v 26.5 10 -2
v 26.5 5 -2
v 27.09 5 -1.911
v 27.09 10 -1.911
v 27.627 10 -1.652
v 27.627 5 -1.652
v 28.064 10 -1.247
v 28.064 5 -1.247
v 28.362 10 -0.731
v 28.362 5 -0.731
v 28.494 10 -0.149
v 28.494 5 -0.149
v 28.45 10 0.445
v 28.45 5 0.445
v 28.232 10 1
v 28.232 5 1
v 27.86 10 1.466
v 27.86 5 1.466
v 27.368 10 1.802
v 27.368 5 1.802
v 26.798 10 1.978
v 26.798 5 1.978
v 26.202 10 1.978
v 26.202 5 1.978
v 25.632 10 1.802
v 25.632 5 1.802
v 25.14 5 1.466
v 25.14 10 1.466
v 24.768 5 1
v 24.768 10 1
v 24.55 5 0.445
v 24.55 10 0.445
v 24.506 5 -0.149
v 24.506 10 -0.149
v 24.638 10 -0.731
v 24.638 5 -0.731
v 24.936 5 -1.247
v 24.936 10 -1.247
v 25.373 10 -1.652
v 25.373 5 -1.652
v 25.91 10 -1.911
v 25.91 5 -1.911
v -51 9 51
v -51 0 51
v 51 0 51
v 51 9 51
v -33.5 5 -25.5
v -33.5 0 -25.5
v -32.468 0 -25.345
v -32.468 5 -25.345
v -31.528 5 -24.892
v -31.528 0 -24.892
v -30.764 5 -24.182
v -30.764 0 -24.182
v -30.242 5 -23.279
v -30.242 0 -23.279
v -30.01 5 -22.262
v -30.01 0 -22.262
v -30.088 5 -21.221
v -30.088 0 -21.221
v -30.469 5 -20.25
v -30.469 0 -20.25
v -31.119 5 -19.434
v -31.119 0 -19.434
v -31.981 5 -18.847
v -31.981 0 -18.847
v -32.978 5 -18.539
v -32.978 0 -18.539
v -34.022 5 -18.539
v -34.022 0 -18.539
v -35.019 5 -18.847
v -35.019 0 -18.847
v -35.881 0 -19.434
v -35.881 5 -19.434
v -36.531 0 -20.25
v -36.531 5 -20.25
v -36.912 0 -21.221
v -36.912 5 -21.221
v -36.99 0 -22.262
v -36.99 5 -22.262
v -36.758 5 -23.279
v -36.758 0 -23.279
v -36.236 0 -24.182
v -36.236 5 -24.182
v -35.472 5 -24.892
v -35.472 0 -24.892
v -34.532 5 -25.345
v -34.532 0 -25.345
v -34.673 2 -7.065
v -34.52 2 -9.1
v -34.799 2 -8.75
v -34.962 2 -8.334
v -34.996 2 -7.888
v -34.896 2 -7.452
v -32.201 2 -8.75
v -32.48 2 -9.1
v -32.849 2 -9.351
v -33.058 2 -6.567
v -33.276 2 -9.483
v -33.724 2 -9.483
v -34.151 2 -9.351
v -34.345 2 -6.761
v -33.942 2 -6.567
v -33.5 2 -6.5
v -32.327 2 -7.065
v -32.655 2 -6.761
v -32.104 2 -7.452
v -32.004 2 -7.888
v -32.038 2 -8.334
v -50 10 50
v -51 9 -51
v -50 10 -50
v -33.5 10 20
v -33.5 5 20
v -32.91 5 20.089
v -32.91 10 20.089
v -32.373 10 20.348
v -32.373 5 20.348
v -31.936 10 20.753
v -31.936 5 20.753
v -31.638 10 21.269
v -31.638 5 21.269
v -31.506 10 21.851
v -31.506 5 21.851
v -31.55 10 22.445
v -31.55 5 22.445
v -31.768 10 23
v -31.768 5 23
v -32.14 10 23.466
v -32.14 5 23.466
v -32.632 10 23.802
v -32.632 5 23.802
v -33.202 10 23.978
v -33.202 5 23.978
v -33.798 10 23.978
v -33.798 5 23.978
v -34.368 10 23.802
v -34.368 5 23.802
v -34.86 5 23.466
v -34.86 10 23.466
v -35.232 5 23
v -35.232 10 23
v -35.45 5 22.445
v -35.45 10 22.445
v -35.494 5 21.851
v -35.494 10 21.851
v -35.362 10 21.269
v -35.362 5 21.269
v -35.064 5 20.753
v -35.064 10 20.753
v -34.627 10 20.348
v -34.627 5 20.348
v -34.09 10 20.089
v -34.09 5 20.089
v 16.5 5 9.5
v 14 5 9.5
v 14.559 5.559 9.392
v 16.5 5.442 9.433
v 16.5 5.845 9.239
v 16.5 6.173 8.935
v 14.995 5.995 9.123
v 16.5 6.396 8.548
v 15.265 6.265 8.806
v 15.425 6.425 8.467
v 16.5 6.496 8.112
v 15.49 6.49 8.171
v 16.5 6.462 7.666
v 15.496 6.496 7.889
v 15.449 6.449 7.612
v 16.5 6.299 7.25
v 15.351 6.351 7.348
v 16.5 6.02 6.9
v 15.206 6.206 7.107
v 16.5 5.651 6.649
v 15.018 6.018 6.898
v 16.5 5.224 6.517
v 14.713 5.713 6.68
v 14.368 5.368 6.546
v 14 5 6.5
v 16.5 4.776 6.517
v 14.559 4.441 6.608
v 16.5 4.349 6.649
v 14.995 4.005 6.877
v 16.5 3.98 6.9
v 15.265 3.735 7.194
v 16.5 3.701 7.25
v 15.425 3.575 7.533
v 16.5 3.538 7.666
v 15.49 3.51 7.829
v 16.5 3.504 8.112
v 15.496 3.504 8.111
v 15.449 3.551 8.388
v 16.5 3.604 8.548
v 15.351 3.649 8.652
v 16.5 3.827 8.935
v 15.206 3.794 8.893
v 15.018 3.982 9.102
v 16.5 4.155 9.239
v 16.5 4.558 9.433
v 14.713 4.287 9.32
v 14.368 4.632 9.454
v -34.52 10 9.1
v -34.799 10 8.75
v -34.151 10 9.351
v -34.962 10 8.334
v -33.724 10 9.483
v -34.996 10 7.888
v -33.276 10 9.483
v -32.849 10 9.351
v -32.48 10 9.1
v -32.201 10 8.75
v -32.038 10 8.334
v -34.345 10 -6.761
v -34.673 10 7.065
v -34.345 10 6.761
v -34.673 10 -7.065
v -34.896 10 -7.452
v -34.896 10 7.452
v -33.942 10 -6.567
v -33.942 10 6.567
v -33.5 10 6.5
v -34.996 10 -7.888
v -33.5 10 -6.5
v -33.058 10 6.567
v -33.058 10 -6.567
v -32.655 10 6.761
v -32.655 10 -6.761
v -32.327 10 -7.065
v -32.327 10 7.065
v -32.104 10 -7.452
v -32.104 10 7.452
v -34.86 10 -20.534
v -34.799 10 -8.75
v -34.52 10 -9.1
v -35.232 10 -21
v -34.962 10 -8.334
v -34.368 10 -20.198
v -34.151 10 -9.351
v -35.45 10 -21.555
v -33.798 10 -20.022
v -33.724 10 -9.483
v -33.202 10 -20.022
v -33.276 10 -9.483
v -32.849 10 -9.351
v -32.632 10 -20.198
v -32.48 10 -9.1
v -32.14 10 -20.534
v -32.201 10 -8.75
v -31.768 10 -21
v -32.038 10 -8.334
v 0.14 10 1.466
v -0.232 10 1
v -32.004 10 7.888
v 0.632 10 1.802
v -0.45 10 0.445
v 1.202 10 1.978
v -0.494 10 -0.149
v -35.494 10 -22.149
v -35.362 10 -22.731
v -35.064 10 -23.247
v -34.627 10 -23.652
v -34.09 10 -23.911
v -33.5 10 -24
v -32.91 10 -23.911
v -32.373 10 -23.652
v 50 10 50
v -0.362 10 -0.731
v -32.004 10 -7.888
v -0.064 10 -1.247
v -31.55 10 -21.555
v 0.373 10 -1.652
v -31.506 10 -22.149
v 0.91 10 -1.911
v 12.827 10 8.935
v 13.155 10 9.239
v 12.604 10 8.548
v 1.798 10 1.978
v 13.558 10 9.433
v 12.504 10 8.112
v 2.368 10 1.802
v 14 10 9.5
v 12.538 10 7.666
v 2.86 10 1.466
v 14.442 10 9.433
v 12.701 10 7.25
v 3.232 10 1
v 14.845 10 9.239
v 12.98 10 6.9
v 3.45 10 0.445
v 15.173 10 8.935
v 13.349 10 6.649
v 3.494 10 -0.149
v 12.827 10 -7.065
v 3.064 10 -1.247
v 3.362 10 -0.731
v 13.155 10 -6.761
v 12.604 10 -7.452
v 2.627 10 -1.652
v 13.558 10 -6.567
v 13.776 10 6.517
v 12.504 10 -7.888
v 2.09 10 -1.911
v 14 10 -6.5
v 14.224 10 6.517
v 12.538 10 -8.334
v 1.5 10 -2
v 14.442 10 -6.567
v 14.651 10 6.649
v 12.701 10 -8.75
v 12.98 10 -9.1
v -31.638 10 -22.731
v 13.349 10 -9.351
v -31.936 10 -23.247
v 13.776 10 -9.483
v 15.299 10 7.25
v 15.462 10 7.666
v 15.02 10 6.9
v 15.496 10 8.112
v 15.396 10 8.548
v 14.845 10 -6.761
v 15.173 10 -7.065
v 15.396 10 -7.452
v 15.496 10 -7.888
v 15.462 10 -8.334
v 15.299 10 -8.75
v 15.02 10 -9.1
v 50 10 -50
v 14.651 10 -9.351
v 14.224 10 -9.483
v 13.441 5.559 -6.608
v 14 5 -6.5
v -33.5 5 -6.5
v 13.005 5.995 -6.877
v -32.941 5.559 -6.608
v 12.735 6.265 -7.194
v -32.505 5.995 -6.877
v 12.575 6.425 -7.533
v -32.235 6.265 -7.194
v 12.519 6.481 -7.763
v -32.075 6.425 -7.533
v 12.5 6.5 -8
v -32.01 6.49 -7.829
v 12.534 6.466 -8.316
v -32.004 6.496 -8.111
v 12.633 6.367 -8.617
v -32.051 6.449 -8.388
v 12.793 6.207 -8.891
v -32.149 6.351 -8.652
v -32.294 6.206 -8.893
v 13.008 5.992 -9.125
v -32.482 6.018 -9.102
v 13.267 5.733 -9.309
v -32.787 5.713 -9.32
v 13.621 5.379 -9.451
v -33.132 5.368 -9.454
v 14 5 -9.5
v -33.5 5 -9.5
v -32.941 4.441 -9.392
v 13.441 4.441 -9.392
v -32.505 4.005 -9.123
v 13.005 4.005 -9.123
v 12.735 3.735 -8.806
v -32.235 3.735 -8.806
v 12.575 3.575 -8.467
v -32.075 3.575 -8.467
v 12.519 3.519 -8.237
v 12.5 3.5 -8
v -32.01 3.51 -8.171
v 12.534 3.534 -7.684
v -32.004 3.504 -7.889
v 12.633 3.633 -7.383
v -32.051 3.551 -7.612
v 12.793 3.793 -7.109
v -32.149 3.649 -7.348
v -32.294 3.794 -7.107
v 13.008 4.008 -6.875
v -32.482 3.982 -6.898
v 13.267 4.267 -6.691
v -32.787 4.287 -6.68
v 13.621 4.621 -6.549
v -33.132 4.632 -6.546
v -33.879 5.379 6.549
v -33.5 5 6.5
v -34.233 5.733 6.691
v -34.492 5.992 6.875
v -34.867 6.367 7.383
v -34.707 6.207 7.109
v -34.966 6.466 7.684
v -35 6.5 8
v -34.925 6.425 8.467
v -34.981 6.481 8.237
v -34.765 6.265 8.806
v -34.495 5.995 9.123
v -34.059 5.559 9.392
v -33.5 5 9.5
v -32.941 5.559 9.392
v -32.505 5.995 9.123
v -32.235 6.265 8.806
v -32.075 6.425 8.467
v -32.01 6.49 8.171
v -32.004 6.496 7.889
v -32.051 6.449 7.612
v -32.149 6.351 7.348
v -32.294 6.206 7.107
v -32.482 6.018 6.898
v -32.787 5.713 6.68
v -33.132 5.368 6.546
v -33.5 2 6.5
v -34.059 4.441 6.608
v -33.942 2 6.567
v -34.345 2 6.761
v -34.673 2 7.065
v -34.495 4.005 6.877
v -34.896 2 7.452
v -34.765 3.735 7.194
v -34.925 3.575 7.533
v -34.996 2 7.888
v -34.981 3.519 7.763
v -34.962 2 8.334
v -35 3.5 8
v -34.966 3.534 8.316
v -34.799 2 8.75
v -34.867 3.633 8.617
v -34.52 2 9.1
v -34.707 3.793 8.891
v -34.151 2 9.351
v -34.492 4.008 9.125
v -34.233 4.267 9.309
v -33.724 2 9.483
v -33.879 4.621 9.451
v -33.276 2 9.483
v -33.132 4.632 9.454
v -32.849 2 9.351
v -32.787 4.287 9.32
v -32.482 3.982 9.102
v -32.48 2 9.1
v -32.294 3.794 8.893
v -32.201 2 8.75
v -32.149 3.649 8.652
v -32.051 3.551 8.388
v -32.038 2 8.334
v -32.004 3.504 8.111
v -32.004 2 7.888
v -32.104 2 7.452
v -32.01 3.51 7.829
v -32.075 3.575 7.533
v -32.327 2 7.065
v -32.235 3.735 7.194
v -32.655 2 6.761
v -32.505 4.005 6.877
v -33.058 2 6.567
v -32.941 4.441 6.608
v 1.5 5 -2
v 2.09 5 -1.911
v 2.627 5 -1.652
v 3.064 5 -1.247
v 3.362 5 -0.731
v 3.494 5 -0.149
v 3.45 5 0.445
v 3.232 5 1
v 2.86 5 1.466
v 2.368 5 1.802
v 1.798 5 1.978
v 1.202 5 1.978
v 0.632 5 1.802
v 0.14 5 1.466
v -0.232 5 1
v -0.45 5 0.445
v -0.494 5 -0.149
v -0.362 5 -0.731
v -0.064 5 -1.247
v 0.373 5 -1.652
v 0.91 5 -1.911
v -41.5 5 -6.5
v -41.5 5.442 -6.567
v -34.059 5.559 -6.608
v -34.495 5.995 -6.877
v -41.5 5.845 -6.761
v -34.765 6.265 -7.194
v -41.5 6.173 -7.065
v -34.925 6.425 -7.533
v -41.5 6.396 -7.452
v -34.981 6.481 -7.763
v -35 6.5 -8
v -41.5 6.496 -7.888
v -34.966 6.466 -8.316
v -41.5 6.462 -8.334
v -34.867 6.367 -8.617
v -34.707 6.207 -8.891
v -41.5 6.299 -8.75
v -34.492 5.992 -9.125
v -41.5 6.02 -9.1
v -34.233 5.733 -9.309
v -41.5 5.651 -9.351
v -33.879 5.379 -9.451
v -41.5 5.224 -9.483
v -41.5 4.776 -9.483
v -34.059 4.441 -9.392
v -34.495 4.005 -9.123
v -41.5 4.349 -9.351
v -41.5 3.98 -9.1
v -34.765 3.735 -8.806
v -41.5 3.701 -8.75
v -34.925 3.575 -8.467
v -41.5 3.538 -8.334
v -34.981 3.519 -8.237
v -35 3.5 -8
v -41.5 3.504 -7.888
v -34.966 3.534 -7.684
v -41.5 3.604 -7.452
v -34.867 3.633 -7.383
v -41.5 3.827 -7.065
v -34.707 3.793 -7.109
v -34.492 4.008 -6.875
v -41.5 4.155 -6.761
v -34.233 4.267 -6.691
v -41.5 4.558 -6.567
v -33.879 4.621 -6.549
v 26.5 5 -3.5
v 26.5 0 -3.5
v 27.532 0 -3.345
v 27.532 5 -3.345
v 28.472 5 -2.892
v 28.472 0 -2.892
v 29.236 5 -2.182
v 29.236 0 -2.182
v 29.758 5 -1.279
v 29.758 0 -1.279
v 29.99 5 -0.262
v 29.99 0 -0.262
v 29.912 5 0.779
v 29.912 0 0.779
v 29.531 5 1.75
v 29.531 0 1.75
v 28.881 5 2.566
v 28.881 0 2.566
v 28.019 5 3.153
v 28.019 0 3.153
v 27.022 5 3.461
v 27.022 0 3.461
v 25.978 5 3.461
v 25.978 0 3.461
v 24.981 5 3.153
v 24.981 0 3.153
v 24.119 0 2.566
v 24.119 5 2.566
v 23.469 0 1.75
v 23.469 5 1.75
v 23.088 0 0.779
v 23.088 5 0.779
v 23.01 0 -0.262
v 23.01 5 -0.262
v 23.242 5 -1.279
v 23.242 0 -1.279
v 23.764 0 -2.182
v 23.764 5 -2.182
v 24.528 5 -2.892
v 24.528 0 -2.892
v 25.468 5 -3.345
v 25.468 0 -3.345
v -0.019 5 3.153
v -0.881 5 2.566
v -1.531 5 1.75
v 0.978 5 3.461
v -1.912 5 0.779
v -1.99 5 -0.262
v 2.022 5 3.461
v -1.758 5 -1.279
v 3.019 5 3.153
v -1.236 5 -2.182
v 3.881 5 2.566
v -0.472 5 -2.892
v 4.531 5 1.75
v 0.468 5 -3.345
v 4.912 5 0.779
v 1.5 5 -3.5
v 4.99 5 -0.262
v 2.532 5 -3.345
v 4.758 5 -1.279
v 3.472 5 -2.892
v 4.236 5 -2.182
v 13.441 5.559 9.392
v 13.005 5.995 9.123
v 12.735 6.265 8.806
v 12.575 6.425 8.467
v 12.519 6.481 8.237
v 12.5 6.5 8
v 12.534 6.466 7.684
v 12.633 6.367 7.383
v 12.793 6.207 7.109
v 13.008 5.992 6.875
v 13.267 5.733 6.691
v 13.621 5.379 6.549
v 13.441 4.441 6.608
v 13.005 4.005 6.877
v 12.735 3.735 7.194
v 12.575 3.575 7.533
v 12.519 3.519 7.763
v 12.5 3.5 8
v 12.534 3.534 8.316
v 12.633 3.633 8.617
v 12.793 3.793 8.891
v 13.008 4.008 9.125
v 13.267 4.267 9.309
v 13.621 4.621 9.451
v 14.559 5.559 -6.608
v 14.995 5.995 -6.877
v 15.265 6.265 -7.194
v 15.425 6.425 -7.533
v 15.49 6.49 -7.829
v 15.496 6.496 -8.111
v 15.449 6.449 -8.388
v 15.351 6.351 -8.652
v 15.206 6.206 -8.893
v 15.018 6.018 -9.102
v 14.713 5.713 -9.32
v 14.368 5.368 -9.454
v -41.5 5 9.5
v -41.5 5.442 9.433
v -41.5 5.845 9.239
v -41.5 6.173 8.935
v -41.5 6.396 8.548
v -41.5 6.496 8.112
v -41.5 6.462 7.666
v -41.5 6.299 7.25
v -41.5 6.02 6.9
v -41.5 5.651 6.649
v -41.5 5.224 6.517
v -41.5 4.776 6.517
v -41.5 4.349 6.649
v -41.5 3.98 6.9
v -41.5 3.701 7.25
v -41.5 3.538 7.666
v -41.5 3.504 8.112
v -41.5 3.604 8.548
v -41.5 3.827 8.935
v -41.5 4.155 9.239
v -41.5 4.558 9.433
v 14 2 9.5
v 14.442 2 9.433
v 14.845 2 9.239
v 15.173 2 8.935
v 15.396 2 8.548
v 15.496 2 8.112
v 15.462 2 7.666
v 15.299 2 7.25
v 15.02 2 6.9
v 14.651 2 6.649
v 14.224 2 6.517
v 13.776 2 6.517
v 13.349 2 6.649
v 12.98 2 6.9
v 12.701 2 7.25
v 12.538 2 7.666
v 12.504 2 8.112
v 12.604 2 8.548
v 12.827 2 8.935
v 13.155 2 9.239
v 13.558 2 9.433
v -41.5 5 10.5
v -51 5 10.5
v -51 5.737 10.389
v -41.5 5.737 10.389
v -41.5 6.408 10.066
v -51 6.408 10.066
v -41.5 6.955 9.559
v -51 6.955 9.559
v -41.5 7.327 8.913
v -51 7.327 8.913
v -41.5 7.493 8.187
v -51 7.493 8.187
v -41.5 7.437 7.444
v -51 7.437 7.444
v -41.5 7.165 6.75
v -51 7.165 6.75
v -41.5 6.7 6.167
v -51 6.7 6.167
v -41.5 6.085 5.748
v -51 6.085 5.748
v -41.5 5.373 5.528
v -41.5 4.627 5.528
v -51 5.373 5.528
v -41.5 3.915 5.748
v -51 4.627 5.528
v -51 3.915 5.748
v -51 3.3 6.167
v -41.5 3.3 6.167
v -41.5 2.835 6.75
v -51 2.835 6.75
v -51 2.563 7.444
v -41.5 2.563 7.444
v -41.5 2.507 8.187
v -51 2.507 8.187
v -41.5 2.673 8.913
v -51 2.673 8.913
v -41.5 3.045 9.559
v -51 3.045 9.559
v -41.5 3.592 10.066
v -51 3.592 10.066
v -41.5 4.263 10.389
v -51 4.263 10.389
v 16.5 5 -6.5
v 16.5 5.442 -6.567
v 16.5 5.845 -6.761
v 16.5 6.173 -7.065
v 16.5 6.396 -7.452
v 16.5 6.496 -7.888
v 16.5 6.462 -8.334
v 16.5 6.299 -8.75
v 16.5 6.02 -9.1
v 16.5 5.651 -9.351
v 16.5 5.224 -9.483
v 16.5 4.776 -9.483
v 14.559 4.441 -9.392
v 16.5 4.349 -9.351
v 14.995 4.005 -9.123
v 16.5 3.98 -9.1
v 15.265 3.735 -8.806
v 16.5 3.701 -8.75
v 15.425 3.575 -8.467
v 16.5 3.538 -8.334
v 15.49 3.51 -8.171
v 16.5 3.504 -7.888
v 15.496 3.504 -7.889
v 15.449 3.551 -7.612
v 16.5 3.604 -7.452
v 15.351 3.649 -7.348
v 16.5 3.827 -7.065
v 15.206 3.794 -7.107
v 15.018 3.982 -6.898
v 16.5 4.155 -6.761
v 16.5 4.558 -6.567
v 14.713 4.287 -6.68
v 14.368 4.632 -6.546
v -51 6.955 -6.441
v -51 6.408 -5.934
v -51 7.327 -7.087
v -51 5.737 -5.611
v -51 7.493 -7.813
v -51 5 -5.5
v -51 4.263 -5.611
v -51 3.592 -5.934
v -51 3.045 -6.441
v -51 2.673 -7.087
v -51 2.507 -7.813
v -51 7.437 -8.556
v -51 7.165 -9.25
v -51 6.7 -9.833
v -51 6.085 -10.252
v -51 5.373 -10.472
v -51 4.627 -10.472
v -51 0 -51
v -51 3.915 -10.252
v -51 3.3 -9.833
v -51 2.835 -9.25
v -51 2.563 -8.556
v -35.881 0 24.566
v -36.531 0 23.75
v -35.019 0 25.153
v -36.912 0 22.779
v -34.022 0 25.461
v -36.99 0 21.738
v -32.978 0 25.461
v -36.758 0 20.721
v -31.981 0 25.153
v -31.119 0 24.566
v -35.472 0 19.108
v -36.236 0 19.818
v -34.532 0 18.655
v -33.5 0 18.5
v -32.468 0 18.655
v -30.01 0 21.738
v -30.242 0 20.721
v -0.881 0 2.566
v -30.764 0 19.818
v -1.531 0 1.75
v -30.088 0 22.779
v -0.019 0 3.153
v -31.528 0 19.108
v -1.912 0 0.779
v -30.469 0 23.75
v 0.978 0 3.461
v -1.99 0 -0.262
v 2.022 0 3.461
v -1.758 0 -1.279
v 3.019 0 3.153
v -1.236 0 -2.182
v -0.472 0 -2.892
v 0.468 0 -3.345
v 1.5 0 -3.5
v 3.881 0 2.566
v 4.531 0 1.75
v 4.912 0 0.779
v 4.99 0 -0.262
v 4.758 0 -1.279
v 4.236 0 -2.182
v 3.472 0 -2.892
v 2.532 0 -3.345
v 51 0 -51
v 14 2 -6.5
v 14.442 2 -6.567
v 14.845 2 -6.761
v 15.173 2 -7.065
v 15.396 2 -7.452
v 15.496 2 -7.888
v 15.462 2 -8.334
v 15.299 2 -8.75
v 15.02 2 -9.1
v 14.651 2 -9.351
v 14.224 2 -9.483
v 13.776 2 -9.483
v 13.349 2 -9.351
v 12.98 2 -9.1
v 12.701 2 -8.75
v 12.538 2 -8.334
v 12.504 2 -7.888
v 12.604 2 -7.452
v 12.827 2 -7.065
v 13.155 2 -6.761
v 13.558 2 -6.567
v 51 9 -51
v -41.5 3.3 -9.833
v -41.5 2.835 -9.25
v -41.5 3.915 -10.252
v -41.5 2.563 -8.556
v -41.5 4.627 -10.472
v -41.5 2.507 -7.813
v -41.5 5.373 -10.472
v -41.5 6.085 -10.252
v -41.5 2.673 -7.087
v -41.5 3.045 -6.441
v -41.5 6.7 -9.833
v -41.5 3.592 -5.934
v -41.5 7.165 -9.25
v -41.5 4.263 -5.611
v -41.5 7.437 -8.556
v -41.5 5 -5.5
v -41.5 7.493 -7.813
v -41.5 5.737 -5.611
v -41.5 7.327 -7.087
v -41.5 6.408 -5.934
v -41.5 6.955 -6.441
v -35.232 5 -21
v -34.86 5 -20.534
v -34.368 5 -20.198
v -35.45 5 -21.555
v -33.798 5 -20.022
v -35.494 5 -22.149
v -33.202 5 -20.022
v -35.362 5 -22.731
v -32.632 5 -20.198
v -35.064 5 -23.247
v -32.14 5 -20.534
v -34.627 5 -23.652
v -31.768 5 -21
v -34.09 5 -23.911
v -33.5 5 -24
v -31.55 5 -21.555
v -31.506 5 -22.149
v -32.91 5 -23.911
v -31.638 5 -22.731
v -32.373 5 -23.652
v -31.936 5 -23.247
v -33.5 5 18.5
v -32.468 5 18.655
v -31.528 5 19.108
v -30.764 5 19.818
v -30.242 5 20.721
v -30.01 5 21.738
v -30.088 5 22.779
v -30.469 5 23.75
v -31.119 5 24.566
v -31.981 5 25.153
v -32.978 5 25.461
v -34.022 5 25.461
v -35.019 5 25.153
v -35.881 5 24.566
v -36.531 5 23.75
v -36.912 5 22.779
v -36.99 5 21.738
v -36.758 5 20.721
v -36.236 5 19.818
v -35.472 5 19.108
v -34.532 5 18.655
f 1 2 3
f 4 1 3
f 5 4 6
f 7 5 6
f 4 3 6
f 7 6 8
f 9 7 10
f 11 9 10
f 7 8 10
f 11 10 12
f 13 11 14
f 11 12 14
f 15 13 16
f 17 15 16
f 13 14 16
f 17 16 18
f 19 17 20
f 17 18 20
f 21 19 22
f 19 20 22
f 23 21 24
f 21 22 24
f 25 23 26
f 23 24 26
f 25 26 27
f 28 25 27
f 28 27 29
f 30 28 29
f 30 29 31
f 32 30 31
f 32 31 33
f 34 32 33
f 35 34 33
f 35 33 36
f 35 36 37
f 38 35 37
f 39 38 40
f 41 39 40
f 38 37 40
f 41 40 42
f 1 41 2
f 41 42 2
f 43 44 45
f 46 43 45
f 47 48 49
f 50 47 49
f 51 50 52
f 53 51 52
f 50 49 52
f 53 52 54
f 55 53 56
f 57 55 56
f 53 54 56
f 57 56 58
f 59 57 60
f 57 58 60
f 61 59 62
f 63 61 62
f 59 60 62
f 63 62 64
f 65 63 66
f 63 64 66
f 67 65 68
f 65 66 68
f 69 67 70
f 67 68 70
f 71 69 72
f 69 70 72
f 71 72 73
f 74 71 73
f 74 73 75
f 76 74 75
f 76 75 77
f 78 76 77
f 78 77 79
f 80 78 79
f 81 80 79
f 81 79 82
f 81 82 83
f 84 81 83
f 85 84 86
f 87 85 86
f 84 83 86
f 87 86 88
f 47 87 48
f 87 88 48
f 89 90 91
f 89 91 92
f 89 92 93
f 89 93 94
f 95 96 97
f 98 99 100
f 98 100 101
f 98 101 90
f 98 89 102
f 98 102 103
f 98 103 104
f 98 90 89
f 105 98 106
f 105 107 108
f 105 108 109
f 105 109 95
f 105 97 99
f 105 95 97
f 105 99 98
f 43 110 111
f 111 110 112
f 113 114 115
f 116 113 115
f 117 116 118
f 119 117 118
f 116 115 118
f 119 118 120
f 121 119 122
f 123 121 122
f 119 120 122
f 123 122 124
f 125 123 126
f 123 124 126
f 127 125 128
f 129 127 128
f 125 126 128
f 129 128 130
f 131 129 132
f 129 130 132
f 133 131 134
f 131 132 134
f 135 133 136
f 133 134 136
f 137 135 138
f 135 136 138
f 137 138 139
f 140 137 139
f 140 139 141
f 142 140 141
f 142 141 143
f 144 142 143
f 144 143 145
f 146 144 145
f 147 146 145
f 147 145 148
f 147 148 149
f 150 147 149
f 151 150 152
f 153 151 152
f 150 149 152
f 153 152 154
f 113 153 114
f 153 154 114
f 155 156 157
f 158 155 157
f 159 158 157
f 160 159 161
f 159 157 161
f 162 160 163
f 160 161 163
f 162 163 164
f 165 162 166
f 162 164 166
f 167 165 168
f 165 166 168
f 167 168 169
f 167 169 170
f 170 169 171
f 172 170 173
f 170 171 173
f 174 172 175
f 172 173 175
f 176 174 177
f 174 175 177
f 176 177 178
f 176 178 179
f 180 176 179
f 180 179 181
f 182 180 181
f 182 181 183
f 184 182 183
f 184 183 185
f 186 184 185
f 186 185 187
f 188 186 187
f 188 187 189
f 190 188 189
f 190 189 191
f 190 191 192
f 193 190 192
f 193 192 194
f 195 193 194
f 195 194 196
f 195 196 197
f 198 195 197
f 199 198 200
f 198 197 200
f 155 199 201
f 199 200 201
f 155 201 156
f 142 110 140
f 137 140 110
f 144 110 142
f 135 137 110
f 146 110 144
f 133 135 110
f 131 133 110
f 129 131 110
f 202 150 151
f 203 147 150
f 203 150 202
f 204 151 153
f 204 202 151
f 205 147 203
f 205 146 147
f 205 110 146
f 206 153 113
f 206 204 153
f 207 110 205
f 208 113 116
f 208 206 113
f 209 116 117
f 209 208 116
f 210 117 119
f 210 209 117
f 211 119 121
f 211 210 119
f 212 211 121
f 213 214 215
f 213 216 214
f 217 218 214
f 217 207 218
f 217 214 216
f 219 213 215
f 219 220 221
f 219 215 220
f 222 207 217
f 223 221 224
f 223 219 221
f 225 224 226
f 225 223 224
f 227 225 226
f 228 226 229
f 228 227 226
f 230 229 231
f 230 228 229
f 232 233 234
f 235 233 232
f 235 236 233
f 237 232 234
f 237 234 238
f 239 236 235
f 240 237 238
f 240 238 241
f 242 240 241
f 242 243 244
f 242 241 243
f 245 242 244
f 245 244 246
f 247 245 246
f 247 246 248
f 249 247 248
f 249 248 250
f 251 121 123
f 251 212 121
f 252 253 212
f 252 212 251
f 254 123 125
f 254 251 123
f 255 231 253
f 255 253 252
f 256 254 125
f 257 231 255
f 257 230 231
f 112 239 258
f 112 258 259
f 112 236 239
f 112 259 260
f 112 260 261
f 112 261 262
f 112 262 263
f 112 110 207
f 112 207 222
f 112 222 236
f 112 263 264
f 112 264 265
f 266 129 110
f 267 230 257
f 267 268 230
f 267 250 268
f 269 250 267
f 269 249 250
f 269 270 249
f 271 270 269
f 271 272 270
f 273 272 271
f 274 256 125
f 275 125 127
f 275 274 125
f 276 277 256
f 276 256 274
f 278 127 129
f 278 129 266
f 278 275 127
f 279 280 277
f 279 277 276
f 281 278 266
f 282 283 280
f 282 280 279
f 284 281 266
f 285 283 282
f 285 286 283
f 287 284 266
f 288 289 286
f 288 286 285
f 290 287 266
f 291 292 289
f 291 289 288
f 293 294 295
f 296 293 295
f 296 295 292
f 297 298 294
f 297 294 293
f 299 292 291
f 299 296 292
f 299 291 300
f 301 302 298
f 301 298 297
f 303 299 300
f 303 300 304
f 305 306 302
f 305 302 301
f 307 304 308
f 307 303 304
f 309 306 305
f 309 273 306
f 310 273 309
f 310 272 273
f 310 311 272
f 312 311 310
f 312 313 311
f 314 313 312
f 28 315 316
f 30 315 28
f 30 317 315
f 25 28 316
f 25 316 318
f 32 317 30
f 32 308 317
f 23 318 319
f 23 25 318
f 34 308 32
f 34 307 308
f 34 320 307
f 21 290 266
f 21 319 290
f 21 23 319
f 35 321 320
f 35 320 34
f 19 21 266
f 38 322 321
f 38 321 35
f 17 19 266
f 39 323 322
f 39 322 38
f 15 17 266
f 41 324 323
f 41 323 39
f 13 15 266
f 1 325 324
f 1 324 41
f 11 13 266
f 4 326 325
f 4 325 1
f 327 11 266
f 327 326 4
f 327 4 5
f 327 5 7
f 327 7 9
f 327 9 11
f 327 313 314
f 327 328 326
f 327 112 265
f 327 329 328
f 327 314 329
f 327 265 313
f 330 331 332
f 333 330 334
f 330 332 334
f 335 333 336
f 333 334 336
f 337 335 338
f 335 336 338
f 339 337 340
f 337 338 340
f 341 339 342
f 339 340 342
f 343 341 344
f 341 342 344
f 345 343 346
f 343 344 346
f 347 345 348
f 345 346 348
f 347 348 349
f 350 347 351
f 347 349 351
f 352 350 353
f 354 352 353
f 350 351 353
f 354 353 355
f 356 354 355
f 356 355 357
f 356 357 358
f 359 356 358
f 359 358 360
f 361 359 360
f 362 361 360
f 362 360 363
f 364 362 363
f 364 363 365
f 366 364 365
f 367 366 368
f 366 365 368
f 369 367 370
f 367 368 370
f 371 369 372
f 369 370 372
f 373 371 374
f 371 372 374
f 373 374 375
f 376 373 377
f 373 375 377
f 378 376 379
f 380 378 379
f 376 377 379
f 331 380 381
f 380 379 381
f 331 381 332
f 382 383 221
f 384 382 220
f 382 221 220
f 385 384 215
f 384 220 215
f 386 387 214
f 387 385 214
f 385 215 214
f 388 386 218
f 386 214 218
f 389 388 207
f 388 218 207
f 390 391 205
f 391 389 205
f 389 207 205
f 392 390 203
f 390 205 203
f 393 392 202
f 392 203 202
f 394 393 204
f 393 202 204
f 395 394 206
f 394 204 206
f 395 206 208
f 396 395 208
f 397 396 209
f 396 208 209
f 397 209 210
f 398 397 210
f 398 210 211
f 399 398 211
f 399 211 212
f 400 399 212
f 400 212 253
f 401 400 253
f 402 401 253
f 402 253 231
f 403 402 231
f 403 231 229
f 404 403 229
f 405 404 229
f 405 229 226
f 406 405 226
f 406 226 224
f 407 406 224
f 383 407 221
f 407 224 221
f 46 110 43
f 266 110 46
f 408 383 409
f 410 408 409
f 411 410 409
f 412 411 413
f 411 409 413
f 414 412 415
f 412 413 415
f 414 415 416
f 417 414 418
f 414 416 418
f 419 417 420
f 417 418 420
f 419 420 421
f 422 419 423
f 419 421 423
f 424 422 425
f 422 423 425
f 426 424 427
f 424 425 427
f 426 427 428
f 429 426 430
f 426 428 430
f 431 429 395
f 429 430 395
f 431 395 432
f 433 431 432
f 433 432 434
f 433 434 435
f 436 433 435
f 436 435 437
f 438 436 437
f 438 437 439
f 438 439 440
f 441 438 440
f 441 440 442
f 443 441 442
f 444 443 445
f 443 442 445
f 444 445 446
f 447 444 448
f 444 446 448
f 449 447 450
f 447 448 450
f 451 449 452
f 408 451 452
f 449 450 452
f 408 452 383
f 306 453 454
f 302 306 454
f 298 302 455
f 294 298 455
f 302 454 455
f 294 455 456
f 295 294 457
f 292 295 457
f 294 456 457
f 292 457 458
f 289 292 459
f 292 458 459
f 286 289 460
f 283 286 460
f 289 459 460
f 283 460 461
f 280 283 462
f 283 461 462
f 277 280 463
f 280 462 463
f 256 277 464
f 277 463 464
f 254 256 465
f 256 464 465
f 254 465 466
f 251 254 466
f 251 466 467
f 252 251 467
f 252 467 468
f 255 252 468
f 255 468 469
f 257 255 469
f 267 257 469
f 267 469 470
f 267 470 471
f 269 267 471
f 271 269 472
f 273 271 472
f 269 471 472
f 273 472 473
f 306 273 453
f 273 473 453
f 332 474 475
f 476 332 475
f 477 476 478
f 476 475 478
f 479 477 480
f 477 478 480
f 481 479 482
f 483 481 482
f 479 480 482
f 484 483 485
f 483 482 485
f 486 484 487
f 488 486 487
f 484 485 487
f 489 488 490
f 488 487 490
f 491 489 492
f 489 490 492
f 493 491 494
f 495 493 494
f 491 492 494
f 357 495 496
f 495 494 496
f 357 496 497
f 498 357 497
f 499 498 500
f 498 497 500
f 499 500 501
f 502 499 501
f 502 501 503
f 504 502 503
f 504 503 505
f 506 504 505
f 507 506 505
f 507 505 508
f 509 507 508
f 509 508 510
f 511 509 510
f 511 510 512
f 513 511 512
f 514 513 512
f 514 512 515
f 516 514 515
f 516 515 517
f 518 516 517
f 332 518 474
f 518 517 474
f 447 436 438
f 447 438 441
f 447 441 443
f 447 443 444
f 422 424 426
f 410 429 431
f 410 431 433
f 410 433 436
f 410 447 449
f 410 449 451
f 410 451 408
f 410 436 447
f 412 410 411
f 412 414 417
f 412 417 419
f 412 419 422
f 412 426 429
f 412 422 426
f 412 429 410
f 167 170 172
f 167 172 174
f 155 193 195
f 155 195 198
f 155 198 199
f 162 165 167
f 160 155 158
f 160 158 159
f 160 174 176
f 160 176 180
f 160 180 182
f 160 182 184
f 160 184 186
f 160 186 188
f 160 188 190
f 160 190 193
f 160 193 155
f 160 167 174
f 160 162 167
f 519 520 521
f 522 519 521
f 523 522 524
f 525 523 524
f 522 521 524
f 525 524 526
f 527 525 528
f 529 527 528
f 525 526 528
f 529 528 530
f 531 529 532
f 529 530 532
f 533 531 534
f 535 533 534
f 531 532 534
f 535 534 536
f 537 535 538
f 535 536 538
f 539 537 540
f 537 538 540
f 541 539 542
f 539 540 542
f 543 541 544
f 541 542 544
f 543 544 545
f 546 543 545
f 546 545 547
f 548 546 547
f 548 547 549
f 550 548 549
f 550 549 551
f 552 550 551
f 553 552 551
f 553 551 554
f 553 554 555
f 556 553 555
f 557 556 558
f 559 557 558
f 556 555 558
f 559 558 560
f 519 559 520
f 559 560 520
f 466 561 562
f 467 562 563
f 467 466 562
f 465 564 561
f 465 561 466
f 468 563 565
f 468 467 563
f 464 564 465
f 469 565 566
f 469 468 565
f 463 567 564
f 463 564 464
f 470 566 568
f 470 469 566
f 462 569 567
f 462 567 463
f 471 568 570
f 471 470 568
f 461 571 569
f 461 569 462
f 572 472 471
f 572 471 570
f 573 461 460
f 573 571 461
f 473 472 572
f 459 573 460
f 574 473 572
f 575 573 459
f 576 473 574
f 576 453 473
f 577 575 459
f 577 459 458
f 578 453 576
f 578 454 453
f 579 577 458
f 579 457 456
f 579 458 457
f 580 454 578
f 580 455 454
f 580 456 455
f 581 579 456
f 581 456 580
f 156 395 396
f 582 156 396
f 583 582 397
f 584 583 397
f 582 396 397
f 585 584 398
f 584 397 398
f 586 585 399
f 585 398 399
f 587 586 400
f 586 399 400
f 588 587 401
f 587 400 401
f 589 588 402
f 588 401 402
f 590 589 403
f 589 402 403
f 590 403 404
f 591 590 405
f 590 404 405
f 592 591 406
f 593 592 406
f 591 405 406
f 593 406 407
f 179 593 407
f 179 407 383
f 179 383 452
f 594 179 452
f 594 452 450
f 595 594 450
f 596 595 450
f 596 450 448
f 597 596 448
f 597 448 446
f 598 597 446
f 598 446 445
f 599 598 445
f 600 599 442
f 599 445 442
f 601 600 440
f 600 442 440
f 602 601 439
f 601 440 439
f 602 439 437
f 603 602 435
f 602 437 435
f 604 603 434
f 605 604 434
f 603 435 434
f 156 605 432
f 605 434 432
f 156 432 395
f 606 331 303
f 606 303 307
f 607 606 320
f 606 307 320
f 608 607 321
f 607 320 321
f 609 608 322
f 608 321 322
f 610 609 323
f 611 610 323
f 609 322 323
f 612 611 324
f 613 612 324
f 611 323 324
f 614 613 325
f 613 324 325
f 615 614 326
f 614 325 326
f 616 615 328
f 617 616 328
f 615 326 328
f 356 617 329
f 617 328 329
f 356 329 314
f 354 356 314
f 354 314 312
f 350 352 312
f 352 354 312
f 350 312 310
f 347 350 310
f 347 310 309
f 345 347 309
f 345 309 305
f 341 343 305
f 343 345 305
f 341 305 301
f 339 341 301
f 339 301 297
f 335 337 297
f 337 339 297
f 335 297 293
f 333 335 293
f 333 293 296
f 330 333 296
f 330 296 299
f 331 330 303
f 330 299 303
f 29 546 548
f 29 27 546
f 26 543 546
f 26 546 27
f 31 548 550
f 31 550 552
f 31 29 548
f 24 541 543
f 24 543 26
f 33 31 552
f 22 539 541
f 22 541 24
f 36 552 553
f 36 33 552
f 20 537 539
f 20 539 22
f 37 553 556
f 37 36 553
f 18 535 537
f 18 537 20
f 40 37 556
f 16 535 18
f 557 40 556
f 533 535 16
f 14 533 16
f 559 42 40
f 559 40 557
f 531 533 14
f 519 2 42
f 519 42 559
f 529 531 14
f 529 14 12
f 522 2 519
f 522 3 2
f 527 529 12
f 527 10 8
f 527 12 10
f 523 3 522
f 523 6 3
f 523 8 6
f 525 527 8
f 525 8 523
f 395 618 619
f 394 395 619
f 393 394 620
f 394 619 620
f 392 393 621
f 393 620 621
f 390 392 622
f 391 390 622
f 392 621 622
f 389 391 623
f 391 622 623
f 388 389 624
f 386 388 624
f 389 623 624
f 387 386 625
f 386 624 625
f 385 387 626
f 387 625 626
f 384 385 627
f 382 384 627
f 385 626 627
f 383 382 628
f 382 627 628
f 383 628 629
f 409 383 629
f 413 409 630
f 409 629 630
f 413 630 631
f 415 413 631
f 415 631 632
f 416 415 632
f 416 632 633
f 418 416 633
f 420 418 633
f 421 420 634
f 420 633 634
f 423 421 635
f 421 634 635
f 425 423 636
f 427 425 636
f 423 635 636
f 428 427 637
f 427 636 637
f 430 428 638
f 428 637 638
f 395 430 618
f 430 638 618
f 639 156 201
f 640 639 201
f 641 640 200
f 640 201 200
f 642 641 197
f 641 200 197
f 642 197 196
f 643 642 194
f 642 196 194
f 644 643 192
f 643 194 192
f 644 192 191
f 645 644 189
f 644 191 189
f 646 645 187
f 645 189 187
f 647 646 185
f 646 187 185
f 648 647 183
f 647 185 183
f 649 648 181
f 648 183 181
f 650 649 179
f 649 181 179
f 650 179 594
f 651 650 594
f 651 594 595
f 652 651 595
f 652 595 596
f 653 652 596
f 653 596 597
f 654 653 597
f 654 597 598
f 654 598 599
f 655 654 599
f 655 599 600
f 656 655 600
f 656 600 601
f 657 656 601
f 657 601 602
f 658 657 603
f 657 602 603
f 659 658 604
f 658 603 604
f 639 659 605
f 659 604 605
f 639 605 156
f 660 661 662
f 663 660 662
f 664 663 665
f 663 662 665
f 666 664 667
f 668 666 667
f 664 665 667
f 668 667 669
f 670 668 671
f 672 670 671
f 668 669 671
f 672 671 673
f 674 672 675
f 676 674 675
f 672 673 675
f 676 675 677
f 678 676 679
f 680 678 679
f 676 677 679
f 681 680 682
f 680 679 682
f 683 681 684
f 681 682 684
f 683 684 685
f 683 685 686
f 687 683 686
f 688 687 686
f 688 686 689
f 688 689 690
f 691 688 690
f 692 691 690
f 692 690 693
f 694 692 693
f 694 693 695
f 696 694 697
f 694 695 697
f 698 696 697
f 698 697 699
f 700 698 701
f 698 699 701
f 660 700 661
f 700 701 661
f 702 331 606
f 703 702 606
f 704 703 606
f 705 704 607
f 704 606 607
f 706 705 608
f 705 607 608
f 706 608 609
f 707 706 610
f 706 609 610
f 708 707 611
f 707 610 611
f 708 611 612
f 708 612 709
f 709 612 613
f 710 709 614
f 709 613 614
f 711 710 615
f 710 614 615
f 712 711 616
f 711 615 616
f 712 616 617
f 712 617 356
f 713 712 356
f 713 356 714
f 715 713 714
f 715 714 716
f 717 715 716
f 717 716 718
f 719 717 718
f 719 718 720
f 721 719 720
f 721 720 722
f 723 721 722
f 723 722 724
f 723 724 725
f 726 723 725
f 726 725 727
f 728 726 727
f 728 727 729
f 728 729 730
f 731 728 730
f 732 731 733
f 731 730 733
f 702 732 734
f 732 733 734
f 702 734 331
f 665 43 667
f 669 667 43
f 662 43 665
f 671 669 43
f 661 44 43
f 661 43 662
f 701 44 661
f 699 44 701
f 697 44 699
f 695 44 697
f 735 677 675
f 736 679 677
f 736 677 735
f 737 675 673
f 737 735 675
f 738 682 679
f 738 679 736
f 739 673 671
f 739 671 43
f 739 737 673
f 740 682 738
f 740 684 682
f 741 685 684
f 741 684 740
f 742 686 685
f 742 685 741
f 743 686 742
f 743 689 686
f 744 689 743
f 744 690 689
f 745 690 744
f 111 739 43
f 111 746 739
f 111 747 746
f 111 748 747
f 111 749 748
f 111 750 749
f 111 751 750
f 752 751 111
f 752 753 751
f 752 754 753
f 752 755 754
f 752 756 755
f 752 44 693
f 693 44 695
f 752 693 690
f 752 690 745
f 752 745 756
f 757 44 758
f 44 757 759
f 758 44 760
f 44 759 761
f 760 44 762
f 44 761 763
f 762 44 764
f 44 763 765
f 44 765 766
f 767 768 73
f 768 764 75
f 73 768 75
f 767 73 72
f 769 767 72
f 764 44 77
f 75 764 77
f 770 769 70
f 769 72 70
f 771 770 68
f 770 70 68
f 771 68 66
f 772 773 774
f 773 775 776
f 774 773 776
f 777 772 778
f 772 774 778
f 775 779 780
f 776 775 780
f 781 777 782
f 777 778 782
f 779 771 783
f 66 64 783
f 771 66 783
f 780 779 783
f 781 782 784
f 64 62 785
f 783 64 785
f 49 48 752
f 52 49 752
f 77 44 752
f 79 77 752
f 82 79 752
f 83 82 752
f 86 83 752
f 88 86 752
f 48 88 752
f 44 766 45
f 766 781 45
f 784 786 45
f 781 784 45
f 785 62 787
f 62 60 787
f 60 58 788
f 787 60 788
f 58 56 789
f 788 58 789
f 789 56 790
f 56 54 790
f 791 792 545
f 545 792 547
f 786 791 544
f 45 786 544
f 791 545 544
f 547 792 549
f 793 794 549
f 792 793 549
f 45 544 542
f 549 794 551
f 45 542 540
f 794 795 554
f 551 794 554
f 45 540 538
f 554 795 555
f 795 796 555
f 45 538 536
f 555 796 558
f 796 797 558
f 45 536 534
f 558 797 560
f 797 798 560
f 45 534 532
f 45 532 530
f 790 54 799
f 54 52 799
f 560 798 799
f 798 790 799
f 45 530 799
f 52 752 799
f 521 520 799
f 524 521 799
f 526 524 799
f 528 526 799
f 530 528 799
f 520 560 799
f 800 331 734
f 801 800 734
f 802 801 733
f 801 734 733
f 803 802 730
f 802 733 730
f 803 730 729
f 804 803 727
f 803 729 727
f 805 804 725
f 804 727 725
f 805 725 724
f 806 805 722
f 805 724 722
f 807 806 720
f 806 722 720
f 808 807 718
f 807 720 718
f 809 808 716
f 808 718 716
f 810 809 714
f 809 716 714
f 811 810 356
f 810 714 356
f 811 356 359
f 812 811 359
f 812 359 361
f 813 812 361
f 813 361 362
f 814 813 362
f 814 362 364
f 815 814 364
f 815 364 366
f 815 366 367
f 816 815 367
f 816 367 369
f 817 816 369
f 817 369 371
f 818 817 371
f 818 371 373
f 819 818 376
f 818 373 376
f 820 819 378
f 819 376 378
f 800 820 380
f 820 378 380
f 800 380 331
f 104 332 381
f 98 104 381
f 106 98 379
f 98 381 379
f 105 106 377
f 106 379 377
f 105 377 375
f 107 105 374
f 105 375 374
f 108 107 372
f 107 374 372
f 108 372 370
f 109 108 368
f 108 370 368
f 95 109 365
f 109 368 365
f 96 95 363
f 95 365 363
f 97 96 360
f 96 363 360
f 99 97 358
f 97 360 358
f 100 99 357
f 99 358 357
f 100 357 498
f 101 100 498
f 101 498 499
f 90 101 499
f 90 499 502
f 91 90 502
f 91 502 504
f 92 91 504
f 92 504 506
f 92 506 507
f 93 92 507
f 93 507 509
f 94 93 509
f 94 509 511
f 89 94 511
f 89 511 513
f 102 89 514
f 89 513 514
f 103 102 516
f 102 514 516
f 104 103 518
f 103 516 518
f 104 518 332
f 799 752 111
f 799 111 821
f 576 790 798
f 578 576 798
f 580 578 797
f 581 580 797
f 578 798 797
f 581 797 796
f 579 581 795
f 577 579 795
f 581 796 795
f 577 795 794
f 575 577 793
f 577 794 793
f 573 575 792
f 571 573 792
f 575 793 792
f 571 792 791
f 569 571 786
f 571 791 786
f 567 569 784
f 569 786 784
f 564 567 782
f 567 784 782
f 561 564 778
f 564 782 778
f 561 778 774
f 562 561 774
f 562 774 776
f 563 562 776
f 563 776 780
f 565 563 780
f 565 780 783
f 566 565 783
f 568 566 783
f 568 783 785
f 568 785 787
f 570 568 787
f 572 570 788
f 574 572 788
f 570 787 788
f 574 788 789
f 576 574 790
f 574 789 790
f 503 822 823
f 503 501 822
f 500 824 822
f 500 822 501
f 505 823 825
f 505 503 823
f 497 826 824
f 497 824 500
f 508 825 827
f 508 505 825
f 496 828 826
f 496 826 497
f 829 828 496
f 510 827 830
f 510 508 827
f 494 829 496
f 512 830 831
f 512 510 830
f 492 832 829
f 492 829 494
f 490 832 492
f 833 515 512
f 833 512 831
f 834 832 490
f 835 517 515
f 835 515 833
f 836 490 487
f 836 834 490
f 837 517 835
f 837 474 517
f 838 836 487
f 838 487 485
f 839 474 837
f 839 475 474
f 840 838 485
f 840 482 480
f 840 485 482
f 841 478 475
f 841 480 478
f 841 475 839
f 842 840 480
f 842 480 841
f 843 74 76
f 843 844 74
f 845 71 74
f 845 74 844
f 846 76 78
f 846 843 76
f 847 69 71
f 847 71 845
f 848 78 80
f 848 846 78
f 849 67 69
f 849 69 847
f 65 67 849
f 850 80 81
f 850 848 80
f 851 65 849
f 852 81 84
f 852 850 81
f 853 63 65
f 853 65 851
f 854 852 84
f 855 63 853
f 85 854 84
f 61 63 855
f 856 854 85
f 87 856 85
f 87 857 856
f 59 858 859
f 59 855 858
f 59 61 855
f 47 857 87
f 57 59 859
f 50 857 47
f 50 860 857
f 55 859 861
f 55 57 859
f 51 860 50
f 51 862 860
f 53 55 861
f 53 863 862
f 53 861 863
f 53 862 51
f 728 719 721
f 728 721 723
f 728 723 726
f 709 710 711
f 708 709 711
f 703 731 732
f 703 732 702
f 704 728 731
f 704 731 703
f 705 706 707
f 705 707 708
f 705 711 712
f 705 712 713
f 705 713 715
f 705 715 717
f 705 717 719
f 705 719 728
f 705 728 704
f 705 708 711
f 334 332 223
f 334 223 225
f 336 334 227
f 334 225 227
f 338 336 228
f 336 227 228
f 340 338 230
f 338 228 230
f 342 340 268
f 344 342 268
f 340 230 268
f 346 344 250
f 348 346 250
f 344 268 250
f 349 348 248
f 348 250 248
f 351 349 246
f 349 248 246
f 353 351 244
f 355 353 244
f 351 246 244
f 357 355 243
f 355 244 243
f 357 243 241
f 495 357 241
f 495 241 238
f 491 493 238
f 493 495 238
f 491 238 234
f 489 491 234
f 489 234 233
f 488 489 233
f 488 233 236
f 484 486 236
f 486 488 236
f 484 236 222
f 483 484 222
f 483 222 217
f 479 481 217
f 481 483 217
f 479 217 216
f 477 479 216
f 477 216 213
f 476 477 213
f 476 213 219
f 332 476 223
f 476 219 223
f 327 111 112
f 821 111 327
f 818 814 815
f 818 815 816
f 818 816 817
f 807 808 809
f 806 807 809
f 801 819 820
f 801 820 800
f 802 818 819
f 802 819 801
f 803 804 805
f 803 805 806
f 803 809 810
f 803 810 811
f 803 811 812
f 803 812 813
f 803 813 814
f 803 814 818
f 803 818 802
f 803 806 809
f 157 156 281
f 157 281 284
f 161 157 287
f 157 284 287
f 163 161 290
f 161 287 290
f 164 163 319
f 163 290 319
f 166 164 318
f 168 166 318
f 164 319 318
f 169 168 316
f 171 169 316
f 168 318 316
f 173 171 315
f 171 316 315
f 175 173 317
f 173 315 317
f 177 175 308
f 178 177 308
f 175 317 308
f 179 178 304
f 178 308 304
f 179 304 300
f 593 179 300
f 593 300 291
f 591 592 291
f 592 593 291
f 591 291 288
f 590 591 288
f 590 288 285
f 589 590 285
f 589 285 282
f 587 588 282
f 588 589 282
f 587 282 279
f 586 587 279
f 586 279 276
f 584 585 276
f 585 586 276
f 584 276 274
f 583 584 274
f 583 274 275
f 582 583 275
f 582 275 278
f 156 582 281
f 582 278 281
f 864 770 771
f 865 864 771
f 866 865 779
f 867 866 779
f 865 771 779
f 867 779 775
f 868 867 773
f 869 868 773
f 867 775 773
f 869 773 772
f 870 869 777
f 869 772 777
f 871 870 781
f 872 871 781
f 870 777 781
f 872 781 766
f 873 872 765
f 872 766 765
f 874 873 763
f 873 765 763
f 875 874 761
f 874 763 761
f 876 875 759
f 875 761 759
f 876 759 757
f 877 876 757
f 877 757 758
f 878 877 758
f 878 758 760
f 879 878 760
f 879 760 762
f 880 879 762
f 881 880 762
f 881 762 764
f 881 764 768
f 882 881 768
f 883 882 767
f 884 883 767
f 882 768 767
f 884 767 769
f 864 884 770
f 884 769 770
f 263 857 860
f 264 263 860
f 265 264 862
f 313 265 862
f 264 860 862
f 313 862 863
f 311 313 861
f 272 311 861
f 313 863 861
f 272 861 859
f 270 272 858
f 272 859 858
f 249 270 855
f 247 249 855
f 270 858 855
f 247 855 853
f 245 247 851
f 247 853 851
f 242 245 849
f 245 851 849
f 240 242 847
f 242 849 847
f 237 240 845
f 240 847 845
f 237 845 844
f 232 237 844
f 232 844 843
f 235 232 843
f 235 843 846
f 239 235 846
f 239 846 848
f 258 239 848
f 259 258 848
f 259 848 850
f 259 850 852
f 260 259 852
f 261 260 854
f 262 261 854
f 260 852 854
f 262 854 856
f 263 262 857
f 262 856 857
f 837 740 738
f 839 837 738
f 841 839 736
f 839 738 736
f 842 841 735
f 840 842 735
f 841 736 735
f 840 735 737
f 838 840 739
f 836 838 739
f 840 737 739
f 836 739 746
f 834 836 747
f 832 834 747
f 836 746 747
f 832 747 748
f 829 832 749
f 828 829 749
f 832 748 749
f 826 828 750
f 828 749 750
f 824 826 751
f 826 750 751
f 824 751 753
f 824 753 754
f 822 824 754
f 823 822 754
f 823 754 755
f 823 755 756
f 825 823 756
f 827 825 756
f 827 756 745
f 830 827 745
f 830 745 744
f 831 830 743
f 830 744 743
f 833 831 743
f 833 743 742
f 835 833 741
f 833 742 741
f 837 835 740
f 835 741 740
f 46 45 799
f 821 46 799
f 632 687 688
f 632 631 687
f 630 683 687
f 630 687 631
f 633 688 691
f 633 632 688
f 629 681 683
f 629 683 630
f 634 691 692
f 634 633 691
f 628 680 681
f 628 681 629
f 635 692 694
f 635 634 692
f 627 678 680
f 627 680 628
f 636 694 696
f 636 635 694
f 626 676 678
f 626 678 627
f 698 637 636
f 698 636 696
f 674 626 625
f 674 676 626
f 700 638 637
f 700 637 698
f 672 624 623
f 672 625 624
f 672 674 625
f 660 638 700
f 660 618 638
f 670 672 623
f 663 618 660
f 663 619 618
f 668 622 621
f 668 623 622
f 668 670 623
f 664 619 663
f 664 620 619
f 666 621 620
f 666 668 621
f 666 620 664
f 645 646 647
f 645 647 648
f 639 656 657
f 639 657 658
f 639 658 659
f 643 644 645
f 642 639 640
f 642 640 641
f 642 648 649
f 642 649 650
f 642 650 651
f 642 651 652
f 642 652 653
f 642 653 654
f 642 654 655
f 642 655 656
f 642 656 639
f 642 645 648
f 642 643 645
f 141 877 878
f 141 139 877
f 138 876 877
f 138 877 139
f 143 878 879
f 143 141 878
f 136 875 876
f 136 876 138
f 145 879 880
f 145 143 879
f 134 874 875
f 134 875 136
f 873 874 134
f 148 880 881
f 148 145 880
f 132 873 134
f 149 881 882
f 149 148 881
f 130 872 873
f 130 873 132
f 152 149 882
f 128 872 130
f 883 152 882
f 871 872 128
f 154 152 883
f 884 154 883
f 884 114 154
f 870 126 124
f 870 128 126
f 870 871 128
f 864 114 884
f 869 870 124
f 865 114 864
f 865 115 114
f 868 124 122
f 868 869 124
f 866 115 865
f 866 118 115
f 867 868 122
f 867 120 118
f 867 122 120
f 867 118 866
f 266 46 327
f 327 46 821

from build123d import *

# Parameters (mm, degrees)
IZIM1_W                     = 102
IZIM1_H                     = 102
Y_KSEKLIK_EKSTR_ZYON1_DEPTH = 10
IZIM4_R                     = 2.5
KES_EKSTR_ZYON1_DEPTH       = 9.5
IZIM5_R                     = 1.5
KES_EKSTR_ZYON2_DEPTH       = 58
IZIM6_R                     = 3.5
KES_EKSTR_ZYON9_DEPTH       = 5
IZIM9_R                     = 2
KES_EKSTR_ZYON10_DEPTH      = 5
IZIM10_R                    = 1.5
KES_EKSTR_ZYON18_DEPTH      = 8
PAH1_SIZE                   = 1


with BuildPart() as part:
    # Çizim1 → Yükseklik-Ekstrüzyon1 (new body)
    with BuildSketch(Plane(origin=(0, 0, 0), x_dir=(1, 0, 0), z_dir=(0, 1, 0))):
        Rectangle(IZIM1_W, IZIM1_H)
    extrude(amount=Y_KSEKLIK_EKSTR_ZYON1_DEPTH)

    # Çizim4 → Kes-Ekstrüzyon1 (cut)
    with BuildSketch(Plane.ZY.offset(51)):
        with Locations((-8, 5)):
            Circle(IZIM4_R)
        with Locations((8, 5)):
            Circle(IZIM4_R)
    extrude(amount=-KES_EKSTR_ZYON1_DEPTH, mode=Mode.SUBTRACT)

    # Çizim5 → Kes-Ekstrüzyon2 (cut)
    with BuildSketch(Plane.ZY.offset(41.5)):
        with Locations((-8, 5)):
            Circle(IZIM5_R)
        with Locations((8, 5)):
            Circle(IZIM5_R)
    extrude(amount=-KES_EKSTR_ZYON2_DEPTH, mode=Mode.SUBTRACT)

    # Çizim6 → Kes-Ekstrüzyon9 (cut)
    with BuildSketch(Plane(origin=(0, 0, 0), x_dir=(-1, 0, 0), z_dir=(0, -1, 0))):
        with Locations(Location((33.5, -22, 0), (0, 0, 90))):
            Circle(IZIM6_R)
        with Locations(Location((33.5, 22, 0), (0, 0, 90))):
            Circle(IZIM6_R)
        with Locations(Location((-1.5, 0, 0), (0, 0, 90))):
            Circle(IZIM6_R)
        with Locations(Location((-26.5, 0, 0), (0, 0, 90))):
            Circle(IZIM6_R)
    extrude(amount=-KES_EKSTR_ZYON9_DEPTH, mode=Mode.SUBTRACT)

    # Çizim9 → Kes-Ekstrüzyon10 (cut)
    with BuildSketch(Plane.XZ.offset(-5)):
        with Locations(Location((-33.5, 22, 0), (0, 0, 270))):
            Circle(IZIM9_R)
        with Locations(Location((1.5, 0, 0), (0, 0, 270))):
            Circle(IZIM9_R)
        with Locations(Location((26.5, 0, 0), (0, 0, 270))):
            Circle(IZIM9_R)
        with Locations(Location((-33.5, -22, 0), (0, 0, 270))):
            Circle(IZIM9_R)
    extrude(amount=-KES_EKSTR_ZYON10_DEPTH, mode=Mode.SUBTRACT)

    # Çizim10 → Kes-Ekstrüzyon18 (cut)
    with BuildSketch(Plane(origin=(0, 10, 0), x_dir=(1, 0, 0), z_dir=(0, 1, 0))):
        with Locations(Location((-33.5, 8, 0), (0, 0, 270))):
            Circle(IZIM10_R)
        with Locations(Location((-33.5, -8, 0), (0, 0, 90))):
            Circle(IZIM10_R)
        with Locations(Location((14, 8, 0), (0, 0, 270))):
            Circle(IZIM10_R)
        with Locations(Location((14, -8, 0), (0, 0, 270))):
            Circle(IZIM10_R)
    extrude(amount=-KES_EKSTR_ZYON18_DEPTH, mode=Mode.SUBTRACT)

    # Pah1
    pah1_edges = [part.edges().sort_by_distance(p)[0] for p in [
        (-51, 10, 0),
        (0, 10, 51),
        (51, 10, 0),
        (0, 10, -51),
    ]]
    chamfer(pah1_edges, length=PAH1_SIZE)


solid = part.part
